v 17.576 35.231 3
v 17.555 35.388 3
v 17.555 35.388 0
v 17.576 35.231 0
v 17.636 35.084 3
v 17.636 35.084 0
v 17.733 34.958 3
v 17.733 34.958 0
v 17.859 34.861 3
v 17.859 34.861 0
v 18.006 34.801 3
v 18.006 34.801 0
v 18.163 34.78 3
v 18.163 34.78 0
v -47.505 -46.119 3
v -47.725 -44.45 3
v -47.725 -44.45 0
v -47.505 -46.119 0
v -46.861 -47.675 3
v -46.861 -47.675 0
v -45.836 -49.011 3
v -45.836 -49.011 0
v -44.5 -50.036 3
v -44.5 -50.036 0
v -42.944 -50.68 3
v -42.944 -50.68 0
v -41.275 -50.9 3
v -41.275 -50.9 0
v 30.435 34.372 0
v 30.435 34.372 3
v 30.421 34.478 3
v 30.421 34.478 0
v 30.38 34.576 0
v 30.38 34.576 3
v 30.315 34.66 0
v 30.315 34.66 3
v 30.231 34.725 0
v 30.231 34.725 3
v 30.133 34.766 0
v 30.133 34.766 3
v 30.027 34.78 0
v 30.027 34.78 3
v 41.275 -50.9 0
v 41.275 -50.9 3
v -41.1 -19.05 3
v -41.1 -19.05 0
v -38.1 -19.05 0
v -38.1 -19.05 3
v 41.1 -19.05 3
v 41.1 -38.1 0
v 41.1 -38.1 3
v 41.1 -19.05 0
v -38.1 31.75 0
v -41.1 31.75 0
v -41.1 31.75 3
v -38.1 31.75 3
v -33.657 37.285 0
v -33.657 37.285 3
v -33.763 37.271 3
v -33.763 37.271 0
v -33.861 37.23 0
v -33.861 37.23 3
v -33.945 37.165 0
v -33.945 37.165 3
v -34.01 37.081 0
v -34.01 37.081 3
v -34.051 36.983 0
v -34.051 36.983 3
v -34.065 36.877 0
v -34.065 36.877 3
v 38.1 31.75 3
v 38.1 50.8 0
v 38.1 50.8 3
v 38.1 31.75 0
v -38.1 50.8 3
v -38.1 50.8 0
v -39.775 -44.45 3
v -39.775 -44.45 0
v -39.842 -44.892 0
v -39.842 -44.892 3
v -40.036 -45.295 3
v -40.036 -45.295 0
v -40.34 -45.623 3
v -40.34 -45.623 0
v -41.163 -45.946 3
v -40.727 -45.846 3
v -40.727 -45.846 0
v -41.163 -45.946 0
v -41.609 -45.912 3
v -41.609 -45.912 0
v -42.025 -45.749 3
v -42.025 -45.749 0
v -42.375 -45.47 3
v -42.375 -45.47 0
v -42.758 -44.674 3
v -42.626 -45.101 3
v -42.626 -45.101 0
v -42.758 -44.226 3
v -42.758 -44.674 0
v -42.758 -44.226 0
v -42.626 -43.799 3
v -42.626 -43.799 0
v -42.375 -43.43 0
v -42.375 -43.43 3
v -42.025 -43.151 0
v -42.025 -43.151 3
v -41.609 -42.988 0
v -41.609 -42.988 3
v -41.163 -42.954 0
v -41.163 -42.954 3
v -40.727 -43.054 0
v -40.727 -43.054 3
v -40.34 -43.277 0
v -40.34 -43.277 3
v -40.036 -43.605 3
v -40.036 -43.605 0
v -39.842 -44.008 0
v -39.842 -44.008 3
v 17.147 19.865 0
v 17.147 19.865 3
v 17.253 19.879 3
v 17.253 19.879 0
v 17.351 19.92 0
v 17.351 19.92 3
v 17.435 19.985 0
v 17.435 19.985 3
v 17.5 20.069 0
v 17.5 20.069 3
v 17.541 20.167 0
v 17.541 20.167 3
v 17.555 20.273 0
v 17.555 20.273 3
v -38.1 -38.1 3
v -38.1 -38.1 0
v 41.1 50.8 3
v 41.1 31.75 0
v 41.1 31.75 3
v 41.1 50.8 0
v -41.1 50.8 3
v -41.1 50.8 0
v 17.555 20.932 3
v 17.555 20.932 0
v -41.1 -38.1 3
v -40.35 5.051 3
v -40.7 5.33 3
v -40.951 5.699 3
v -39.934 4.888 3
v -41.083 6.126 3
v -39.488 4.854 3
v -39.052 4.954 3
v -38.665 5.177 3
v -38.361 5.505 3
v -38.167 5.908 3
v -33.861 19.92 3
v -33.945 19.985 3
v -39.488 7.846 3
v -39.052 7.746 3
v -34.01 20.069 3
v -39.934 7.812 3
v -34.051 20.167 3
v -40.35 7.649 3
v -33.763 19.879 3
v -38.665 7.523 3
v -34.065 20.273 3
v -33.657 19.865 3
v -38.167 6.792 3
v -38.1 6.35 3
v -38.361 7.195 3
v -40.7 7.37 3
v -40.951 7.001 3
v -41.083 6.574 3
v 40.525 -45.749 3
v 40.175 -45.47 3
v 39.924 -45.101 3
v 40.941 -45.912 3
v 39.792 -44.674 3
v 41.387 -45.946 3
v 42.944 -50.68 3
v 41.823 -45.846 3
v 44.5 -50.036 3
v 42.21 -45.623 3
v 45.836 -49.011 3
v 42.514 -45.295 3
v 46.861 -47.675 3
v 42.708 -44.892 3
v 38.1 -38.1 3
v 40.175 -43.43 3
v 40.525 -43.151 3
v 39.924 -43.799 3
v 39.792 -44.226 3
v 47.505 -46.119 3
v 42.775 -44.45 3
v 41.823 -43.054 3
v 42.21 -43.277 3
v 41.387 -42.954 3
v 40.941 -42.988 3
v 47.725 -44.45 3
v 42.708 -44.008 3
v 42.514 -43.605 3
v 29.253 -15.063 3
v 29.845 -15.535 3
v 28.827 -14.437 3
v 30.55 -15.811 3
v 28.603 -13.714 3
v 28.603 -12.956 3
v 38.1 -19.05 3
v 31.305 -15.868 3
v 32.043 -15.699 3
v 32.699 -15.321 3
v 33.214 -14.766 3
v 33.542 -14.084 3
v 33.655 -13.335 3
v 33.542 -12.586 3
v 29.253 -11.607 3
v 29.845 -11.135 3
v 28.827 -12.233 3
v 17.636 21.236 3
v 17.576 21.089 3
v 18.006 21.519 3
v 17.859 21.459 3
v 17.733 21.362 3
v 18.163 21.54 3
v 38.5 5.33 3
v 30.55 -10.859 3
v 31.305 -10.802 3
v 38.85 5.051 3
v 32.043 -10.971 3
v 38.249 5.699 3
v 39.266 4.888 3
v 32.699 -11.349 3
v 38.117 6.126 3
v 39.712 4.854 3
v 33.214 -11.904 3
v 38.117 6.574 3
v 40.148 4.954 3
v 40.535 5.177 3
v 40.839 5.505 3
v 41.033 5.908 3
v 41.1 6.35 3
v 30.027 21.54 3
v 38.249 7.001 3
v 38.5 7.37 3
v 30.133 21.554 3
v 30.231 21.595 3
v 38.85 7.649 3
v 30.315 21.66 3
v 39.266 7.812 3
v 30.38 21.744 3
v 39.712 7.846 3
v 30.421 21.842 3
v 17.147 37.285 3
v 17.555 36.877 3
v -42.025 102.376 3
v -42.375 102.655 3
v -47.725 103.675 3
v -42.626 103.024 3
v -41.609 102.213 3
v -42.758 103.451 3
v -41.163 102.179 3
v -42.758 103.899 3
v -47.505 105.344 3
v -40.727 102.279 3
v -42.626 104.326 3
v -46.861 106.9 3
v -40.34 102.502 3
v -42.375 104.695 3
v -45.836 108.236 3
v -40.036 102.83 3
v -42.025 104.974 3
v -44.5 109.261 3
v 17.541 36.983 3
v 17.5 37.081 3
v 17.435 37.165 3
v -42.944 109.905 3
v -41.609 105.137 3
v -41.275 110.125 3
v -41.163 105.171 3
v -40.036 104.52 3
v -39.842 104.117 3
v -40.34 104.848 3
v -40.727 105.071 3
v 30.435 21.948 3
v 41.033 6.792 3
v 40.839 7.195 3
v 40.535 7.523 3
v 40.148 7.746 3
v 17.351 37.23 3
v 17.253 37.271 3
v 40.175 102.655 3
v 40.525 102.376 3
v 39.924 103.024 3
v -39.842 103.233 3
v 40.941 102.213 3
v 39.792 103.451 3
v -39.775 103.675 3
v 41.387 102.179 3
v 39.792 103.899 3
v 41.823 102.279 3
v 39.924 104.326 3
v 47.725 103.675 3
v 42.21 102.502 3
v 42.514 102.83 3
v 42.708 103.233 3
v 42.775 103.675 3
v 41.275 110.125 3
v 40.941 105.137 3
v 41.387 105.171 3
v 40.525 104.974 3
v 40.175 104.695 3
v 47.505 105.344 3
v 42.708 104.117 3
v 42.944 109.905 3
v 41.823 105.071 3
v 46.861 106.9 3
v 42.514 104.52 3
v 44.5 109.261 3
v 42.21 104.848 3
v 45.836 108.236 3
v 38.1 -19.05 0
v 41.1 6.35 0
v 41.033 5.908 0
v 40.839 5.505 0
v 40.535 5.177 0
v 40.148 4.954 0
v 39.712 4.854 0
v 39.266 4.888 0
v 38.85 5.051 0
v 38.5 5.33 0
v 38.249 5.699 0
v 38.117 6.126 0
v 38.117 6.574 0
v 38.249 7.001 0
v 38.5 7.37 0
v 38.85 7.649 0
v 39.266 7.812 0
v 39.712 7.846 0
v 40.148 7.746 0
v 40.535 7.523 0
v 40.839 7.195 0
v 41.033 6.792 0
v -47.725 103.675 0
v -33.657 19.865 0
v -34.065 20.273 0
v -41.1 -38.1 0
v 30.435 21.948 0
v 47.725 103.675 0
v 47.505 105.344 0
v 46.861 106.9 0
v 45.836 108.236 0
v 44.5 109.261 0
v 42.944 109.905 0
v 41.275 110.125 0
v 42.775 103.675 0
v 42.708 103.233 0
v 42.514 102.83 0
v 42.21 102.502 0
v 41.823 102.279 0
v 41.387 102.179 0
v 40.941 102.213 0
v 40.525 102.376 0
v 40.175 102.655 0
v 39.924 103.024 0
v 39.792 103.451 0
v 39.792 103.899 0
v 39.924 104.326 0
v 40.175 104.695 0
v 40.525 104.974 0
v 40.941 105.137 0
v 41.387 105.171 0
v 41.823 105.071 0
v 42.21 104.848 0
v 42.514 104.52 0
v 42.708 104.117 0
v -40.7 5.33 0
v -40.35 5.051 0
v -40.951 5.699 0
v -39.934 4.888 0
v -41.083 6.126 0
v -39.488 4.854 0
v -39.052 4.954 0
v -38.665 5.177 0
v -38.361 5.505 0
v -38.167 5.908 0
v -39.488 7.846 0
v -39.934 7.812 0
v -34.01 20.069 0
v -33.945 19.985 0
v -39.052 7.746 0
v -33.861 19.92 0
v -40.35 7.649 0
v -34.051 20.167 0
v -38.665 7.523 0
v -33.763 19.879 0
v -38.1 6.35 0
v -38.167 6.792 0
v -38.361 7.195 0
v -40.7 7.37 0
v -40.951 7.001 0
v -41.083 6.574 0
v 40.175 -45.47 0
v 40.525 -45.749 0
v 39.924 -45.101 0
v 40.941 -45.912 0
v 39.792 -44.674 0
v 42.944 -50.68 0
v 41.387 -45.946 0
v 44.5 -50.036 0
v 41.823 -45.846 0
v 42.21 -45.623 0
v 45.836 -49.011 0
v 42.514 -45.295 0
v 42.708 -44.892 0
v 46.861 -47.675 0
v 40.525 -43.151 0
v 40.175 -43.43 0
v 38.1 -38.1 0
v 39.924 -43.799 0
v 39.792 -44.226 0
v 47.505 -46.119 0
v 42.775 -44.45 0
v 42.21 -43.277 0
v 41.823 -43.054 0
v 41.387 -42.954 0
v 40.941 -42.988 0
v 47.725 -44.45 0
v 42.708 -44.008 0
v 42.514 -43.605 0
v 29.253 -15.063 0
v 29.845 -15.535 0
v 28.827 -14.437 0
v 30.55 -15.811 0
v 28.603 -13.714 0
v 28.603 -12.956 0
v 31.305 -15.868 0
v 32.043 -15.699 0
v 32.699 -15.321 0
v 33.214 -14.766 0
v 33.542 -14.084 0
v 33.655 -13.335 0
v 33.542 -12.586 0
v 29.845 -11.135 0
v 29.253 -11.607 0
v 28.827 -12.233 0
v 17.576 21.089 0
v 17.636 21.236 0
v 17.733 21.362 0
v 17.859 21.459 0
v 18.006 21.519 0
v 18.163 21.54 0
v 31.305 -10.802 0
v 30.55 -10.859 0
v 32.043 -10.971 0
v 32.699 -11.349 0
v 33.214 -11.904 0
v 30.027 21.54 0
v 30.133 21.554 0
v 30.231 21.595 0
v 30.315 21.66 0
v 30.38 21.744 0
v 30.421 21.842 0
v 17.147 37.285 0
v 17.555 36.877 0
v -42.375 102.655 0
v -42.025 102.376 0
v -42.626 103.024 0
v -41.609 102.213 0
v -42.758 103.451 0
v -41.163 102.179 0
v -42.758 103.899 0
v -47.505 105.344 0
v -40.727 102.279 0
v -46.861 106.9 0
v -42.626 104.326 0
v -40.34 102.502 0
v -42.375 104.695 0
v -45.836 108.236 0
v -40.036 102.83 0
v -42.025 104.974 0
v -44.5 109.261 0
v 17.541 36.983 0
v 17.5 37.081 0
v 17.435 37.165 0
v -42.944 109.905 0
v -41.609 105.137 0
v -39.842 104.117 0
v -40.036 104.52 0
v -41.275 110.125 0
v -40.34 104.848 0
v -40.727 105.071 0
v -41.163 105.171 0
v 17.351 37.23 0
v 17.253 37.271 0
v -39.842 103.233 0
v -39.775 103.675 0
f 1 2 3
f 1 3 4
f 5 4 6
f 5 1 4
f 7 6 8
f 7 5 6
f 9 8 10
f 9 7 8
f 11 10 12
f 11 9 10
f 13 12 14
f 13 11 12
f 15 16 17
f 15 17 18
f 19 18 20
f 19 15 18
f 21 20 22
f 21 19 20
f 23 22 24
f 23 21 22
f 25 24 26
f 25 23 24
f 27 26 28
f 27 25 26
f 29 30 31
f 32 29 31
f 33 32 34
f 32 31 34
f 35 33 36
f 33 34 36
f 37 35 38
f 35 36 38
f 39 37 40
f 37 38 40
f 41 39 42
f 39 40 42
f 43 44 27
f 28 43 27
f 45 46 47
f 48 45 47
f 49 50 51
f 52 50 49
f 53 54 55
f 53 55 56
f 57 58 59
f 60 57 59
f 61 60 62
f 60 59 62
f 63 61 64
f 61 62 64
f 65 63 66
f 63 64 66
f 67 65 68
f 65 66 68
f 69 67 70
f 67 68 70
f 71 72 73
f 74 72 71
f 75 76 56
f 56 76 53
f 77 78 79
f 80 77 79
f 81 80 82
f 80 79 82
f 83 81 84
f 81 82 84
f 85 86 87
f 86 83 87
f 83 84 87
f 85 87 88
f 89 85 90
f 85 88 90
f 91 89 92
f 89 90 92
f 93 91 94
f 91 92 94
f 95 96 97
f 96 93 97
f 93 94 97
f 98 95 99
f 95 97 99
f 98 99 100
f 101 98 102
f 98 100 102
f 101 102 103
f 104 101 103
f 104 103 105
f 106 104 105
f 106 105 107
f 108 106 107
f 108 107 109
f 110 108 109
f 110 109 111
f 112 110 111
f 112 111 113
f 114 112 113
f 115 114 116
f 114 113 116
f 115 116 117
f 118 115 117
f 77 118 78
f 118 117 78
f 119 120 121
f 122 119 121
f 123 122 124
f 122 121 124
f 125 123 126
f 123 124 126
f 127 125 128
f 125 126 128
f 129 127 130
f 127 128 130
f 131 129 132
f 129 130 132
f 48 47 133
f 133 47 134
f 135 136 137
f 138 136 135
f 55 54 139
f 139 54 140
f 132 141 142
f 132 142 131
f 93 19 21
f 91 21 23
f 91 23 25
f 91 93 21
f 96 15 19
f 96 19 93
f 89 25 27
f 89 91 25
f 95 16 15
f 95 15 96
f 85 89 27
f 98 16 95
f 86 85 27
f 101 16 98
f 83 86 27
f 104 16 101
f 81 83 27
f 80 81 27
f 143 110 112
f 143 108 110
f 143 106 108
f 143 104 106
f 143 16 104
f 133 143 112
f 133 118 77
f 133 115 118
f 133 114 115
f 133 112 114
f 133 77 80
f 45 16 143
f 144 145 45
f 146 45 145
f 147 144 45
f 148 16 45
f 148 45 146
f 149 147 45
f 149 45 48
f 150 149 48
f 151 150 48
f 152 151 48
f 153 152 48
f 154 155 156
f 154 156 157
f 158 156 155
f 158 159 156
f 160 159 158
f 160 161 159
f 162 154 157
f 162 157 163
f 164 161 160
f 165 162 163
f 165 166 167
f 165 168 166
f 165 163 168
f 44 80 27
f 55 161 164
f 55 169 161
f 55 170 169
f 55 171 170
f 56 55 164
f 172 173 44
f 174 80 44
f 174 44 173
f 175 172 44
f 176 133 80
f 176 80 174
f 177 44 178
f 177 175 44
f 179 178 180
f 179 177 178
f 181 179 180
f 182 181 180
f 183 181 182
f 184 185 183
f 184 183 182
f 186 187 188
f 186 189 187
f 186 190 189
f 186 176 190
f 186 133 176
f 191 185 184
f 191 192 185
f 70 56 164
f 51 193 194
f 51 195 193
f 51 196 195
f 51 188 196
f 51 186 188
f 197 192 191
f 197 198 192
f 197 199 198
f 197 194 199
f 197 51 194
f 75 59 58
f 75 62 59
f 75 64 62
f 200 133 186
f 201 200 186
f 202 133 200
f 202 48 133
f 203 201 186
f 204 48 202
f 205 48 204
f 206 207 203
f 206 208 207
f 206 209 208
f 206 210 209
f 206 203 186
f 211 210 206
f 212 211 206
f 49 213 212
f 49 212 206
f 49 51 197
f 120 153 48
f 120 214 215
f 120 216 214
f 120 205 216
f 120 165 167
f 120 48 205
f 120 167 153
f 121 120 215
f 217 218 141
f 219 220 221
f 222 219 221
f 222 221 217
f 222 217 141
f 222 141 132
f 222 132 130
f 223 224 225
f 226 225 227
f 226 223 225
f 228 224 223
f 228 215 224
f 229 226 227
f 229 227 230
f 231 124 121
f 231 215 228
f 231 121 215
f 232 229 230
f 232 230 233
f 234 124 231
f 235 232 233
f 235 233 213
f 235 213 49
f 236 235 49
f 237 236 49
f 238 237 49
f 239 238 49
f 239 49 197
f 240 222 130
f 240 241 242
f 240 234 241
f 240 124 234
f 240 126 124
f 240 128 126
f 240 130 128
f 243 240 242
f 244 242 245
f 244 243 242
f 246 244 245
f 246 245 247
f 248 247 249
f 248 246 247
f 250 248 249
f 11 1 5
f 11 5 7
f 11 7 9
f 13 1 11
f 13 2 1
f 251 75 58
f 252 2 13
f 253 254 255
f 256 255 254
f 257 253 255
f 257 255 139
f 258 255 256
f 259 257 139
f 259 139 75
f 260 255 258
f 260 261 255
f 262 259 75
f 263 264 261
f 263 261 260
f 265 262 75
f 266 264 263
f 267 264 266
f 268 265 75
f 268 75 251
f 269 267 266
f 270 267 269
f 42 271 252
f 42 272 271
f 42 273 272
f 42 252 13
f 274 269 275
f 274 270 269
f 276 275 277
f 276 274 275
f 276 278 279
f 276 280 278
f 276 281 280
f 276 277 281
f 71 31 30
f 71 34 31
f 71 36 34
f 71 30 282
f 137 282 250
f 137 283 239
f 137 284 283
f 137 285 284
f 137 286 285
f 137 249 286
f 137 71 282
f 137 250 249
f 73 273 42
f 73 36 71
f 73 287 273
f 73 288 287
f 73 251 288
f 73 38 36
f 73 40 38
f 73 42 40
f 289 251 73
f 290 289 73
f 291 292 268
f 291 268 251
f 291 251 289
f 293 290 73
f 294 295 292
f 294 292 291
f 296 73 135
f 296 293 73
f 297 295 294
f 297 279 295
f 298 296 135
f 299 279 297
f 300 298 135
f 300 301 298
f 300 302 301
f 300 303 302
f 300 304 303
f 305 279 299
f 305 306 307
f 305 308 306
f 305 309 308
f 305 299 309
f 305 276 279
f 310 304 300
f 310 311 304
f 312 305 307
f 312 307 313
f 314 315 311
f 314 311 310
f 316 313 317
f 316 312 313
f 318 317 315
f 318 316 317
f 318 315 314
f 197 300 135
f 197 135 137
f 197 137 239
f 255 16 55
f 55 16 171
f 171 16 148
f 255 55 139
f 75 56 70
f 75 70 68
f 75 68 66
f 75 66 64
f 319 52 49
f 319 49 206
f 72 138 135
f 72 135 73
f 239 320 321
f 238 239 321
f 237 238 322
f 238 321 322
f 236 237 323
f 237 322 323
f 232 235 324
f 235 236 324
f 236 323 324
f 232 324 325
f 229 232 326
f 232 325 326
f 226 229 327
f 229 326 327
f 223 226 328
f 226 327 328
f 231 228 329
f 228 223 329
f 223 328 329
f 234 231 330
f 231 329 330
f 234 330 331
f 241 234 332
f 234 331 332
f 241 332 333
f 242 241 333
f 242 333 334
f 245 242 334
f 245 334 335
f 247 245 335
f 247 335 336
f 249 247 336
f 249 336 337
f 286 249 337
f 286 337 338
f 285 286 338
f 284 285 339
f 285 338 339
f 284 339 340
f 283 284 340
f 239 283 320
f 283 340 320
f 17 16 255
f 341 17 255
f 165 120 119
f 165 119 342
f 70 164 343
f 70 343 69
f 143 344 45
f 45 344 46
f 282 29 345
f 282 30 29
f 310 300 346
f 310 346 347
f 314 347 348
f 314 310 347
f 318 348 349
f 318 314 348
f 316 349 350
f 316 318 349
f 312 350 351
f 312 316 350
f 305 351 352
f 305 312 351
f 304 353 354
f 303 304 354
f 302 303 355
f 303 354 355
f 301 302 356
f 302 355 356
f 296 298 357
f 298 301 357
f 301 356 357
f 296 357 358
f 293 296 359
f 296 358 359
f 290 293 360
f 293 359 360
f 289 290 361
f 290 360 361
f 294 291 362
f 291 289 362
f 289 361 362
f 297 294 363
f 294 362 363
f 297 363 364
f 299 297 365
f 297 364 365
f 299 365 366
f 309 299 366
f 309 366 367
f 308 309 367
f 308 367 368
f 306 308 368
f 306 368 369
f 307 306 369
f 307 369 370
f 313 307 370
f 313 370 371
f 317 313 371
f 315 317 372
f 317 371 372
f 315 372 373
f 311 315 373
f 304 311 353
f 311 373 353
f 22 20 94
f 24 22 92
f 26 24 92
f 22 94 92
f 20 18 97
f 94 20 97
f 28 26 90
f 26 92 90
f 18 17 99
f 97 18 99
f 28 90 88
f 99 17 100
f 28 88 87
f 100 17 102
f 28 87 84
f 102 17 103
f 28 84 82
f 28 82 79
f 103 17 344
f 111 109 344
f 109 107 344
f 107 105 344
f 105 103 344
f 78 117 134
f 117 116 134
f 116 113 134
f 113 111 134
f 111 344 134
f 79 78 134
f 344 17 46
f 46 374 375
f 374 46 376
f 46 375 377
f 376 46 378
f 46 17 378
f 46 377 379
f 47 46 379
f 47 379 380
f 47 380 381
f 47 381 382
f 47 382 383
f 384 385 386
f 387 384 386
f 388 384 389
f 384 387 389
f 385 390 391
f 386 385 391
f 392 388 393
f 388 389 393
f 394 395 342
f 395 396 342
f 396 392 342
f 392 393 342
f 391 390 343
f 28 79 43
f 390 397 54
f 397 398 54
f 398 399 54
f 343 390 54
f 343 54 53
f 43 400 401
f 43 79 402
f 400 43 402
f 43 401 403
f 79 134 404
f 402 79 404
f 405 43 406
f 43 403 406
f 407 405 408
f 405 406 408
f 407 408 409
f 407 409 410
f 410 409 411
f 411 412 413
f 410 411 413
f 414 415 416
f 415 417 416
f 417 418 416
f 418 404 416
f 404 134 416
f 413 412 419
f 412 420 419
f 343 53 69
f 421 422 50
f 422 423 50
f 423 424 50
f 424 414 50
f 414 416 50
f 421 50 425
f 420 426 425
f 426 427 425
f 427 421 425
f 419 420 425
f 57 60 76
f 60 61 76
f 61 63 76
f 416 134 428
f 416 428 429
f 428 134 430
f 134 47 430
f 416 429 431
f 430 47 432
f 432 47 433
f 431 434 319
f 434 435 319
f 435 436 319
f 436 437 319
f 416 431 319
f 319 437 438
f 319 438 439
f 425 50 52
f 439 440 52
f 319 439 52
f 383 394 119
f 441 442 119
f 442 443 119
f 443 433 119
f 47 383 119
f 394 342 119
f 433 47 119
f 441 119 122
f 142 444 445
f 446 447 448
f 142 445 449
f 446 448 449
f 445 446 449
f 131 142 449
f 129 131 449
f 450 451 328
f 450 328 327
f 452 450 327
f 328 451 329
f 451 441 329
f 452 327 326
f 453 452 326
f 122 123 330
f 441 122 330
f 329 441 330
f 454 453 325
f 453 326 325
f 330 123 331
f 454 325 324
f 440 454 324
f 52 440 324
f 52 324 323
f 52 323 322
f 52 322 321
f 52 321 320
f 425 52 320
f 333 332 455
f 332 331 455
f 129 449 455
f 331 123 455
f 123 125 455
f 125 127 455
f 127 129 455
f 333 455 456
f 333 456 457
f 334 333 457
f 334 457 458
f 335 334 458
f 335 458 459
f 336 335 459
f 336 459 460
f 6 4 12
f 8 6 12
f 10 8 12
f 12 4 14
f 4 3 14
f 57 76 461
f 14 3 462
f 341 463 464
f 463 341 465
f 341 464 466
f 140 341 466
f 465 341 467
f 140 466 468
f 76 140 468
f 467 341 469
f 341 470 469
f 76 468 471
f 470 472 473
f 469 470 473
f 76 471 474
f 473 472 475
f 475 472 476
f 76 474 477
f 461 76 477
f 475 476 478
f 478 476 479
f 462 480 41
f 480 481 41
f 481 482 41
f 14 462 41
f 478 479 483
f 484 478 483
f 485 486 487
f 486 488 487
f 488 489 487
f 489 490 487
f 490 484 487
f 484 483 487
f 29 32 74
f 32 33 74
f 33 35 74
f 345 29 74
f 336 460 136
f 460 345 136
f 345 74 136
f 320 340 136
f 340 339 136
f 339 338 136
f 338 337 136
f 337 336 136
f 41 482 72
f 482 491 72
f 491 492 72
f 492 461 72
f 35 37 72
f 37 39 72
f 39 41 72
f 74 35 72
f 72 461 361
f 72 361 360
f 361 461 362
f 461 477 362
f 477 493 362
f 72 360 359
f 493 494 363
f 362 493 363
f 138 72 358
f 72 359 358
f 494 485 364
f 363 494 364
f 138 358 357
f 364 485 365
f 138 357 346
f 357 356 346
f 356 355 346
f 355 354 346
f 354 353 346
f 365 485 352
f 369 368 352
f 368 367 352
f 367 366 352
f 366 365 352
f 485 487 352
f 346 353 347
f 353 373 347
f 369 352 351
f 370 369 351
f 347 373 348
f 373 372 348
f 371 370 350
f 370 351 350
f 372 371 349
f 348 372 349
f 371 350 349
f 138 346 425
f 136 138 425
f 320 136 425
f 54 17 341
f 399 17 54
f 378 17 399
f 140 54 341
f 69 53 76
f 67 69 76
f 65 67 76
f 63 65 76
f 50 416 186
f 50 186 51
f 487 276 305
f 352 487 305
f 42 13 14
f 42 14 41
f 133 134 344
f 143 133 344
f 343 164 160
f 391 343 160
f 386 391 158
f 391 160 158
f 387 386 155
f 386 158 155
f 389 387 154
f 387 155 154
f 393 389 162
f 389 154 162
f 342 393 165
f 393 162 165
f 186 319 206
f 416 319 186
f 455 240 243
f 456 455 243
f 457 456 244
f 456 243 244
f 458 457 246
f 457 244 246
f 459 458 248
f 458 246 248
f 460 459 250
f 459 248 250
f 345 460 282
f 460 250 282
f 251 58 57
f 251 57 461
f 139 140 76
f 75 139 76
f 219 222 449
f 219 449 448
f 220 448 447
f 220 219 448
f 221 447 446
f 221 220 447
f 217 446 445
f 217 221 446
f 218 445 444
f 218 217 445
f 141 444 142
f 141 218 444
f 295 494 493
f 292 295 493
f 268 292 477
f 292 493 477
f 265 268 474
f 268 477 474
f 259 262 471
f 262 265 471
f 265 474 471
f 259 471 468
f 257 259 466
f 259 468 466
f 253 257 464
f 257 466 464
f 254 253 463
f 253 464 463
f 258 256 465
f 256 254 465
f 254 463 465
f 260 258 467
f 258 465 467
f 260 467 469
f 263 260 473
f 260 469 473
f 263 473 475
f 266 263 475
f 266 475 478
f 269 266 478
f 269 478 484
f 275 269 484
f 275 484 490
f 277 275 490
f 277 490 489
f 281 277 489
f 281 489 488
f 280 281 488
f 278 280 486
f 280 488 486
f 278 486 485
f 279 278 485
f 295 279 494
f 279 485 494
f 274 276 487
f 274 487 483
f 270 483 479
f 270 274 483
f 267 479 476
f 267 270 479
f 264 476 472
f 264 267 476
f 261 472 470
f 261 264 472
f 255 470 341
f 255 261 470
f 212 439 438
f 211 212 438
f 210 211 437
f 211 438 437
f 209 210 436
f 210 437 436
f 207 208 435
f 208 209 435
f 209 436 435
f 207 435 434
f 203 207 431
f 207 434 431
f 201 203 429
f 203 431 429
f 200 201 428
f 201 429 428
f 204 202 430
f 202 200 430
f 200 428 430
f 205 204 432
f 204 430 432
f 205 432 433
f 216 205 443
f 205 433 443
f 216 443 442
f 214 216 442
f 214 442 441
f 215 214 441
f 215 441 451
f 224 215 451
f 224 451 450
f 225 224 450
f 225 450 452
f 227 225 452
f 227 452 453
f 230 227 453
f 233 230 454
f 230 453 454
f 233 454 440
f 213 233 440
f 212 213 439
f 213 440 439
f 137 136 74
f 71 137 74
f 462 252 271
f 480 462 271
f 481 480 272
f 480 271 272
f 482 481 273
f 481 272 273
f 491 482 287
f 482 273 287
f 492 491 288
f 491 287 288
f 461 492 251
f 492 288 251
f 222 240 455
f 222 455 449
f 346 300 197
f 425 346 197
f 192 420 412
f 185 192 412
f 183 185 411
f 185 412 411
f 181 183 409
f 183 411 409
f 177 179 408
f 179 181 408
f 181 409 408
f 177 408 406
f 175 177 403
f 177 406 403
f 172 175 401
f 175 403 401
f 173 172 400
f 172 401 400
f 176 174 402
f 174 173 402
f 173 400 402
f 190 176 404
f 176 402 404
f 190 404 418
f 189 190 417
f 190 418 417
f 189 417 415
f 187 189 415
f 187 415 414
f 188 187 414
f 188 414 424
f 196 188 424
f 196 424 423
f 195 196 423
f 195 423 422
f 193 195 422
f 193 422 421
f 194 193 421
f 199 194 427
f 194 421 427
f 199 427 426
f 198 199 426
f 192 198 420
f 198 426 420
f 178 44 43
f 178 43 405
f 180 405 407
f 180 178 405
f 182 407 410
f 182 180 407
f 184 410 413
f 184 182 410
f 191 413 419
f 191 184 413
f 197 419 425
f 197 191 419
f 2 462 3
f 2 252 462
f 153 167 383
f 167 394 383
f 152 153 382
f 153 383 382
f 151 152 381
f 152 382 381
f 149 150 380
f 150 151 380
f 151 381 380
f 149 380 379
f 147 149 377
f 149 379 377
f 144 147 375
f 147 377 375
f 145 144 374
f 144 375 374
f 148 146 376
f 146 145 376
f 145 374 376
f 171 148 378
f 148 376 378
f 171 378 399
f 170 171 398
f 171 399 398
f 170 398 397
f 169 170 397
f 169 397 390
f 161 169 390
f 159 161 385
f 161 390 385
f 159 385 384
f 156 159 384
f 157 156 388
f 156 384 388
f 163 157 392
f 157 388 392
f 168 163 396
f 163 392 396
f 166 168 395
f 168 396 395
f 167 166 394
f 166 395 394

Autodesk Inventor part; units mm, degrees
ref_plane "YZ Plane" through (0, 0, 0) normal (1, 0, 0) x (0, 1, 0)
ref_plane "XZ Plane" through (0, 0, 0) normal (0, 1, 0) x (-1, 0, 0)
ref_plane "XY Plane" through (0, 0, 0) normal (0, 0, 1) x (1, 0, 0)
sketch "Sketch1" plane through (0, 0, 0) normal (0, 0, 1) x (1, 0, 0)
  line L0 (30.48, -47.625) -> (-30.48, -47.625) construction
  line L1 (-34.925, -43.18) -> (-34.925, 43.18) construction
  line L2 (-30.48, 47.625) -> (30.48, 47.625) construction
  line L3 (34.925, 43.18) -> (34.925, -43.18) construction
  line L4 (34.925, -47.625) -> (-34.925, 47.625) construction
  line L5 (-34.925, -47.625) -> (34.925, 47.625) construction
  arc A0 (-30.48, 47.625) -> (-34.925, 43.18) centre (-30.48, 43.18) ccw construction
  arc A1 (34.925, 43.18) -> (30.48, 47.625) centre (30.48, 43.18) ccw construction
  arc A2 (30.48, -47.625) -> (34.925, -43.18) centre (30.48, -43.18) ccw construction
  arc A3 (-34.925, -43.18) -> (-30.48, -47.625) centre (-30.48, -43.18) ccw construction
  circle A4 centre (-30.48, 43.18) radius 1.5
  circle A5 centre (30.48, 43.18) radius 1.5
  circle A6 centre (-30.48, -43.18) radius 1.5
  circle A7 centre (30.48, -43.18) radius 1.5
  circle A8 centre (0, -22.86) radius 6.35
  line L6 (-3.175, -7.62) -> (3.175, -7.62) construction
  line L7 (-3.175, -12.065) -> (3.175, -12.065)
  line L8 (3.175, -3.175) -> (-3.175, -3.175)
  arc A9 (-3.175, -3.175) -> (-3.175, -12.065) centre (-3.175, -7.62) ccw
  arc A10 (3.175, -12.065) -> (3.175, -3.175) centre (3.175, -7.62) ccw
  line L9 (-35.3, 57.15) -> (35.3, 57.15) construction
  line L10 (35.3, 57.15) -> (35.3, 106.85) construction
  line L11 (35.3, 106.85) -> (-35.3, 106.85) construction
  line L12 (-35.3, 106.85) -> (-35.3, 57.15) construction
  circle A11 centre (-33.25, 104.75) radius 1.25
  circle A12 centre (33.25, 104.75) radius 1.25
  circle A13 centre (33.25, 59.25) radius 1.25
  circle A14 centre (-33.25, 59.25) radius 1.25
  line L13 (-41.275, 110.025) -> (41.275, 110.025)
  line L14 (47.625, 103.675) -> (47.625, -44.45)
  line L15 (41.275, -50.8) -> (-41.275, -50.8)
  line L16 (-47.625, -44.45) -> (-47.625, 103.675)
  arc A15 (-41.275, 110.025) -> (-47.625, 103.675) centre (-41.275, 103.675) ccw
  arc A16 (47.625, 103.675) -> (41.275, 110.025) centre (41.275, 103.675) ccw
  arc A17 (41.275, -50.8) -> (47.625, -44.45) centre (41.275, -44.45) ccw
  arc A18 (-47.625, -44.45) -> (-41.275, -50.8) centre (-41.275, -44.45) ccw
  circle A19 centre (-41.275, 103.675) radius 1.5
  circle A20 centre (-41.275, -44.45) radius 1.5
  circle A21 centre (41.275, -44.45) radius 1.5
  circle A22 centre (41.275, 103.675) radius 1.5
  line L17 (-0.635, -22.225) -> (-0.635, -20.32)
  line L18 (-0.635, -20.32) -> (-3.175, -22.86)
  line L19 (-3.175, -22.86) -> (-0.635, -25.4)
  line L20 (-0.635, -25.4) -> (-0.635, -23.495)
  line L21 (-0.635, -23.495) -> (3.175, -23.495)
  line L22 (3.175, -23.495) -> (3.175, -20.32)
  line L23 (3.175, -20.32) -> (1.905, -20.32)
  line L24 (1.905, -20.32) -> (1.905, -22.225)
  line L25 (1.905, -22.225) -> (-0.635, -22.225)
  line L26 (-2.54, -8.89) -> (2.54, -8.89)
  line L27 (2.54, -8.89) -> (2.54, -7.62)
  line L28 (2.54, -7.62) -> (0, -5.08)
  line L29 (0, -5.08) -> (-2.54, -7.62)
  line L30 (-2.54, -7.62) -> (-2.54, -8.89)
  arc A23 (-19.685, -26.035) -> (-10.795, -26.035) centre (-15.24, -26.035) ccw
  line L31 (-19.685, -19.685) -> (-19.685, -26.035)
  arc A24 (-10.795, -19.685) -> (-19.685, -19.685) centre (-15.24, -19.685) ccw
  line L32 (-10.795, -26.035) -> (-10.795, -19.685)
  line L33 (-13.97, -25.4) -> (-13.97, -20.32)
  line L34 (-13.97, -20.32) -> (-15.24, -20.32)
  line L35 (-15.24, -20.32) -> (-17.78, -22.86)
  line L36 (-17.78, -22.86) -> (-15.24, -25.4)
  line L37 (-15.24, -25.4) -> (-13.97, -25.4)
  arc A25 (3.175, -42.545) -> (3.175, -33.655) centre (3.175, -38.1) ccw
  line L38 (-3.175, -42.545) -> (3.175, -42.545)
  arc A26 (-3.175, -33.655) -> (-3.175, -42.545) centre (-3.175, -38.1) ccw
  line L39 (3.175, -33.655) -> (-3.175, -33.655)
  line L40 (2.54, -36.83) -> (-2.54, -36.83)
  line L41 (-2.54, -36.83) -> (-2.54, -38.1)
  line L42 (-2.54, -38.1) -> (0, -40.64)
  line L43 (0, -40.64) -> (2.54, -38.1)
  line L44 (2.54, -38.1) -> (2.54, -36.83)
  arc A27 (19.685, -19.685) -> (10.795, -19.685) centre (15.24, -19.685) ccw
  line L45 (19.685, -26.035) -> (19.685, -19.685)
  arc A28 (10.795, -26.035) -> (19.685, -26.035) centre (15.24, -26.035) ccw
  line L46 (10.795, -19.685) -> (10.795, -26.035)
  line L47 (13.97, -20.32) -> (13.97, -25.4)
  line L48 (13.97, -25.4) -> (15.24, -25.4)
  line L49 (15.24, -25.4) -> (17.78, -22.86)
  line L50 (17.78, -22.86) -> (15.24, -20.32)
  line L51 (15.24, -20.32) -> (13.97, -20.32)
  line L52 (5.205, 21.035) -> (16.385, 21.035) construction
  line L53 (16.385, 21.035) -> (16.385, 36.115) construction
  line L54 (16.385, 36.115) -> (5.205, 36.115) construction
  line L55 (5.205, 36.115) -> (5.205, 21.035) construction
  line L56 (5.205, 21.035) -> (16.385, 36.115) construction
  line L57 (16.385, 21.035) -> (5.205, 36.115) construction
  line L58 (20.265, 22.71) -> (29.265, 22.71) construction
  line L59 (29.265, 22.71) -> (29.265, 33.61) construction
  line L60 (29.265, 33.61) -> (20.265, 33.61) construction
  line L61 (20.265, 33.61) -> (20.265, 22.71) construction
  line L62 (-7.495, 36.115) -> (-7.495, 21.035) construction
  line L63 (3.685, 36.115) -> (-7.495, 36.115) construction
  line L64 (3.685, 21.035) -> (3.685, 36.115) construction
  line L65 (-7.495, 21.035) -> (3.685, 21.035) construction
  line L66 (-20.195, 36.115) -> (-20.195, 21.035) construction
  line L67 (-9.015, 36.115) -> (-20.195, 36.115) construction
  line L68 (-9.015, 21.035) -> (-9.015, 36.115) construction
  line L69 (-20.195, 21.035) -> (-9.015, 21.035) construction
  line L70 (-32.895, 36.115) -> (-32.895, 21.035) construction
  line L71 (-21.715, 36.115) -> (-32.895, 36.115) construction
  line L72 (-21.715, 21.035) -> (-21.715, 36.115) construction
  line L73 (-32.895, 21.035) -> (-21.715, 21.035) construction
  line L74 (-33.657, 37.385) -> (17.147, 37.385)
  line L75 (17.655, 36.877) -> (17.655, 35.388)
  line L76 (18.163, 34.88) -> (30.027, 34.88)
  line L77 (30.535, 34.372) -> (30.535, 21.948)
  line L78 (30.027, 21.44) -> (18.163, 21.44)
  line L79 (17.655, 20.932) -> (17.655, 20.273)
  line L80 (17.147, 19.765) -> (-33.657, 19.765)
  line L81 (-34.165, 20.273) -> (-34.165, 36.877)
  arc A29 (-33.657, 37.385) -> (-34.165, 36.877) centre (-33.657, 36.877) ccw
  arc A30 (17.655, 36.877) -> (17.147, 37.385) centre (17.147, 36.877) ccw
  arc A31 (17.655, 35.388) -> (18.163, 34.88) centre (18.163, 35.388) ccw
  arc A32 (30.535, 34.372) -> (30.027, 34.88) centre (30.027, 34.372) ccw
  arc A33 (30.027, 21.44) -> (30.535, 21.948) centre (30.027, 21.948) ccw
  arc A34 (18.163, 21.44) -> (17.655, 20.932) centre (18.163, 20.932) ccw
  arc A35 (17.147, 19.765) -> (17.655, 20.273) centre (17.147, 20.273) ccw
  arc A36 (-34.165, 20.273) -> (-33.657, 19.765) centre (-33.657, 20.273) ccw
  line L82 (-41.1, 50.8) -> (-38.1, 50.8)
  line L83 (-38.1, 50.8) -> (-38.1, 31.75)
  line L84 (-38.1, -38.1) -> (-41.1, -38.1)
  line L85 (-41.1, -38.1) -> (-41.1, -19.05)
  line L86 (-41.1, 31.75) -> (-38.1, 31.75)
  line L87 (-41.1, -19.05) -> (-38.1, -19.05)
  line L88 (-41.1, 31.75) -> (-41.1, 50.8)
  line L89 (-41.1, -19.05) -> (-41.1, 31.75) construction
  line L90 (-38.1, -19.05) -> (-38.1, -38.1)
  line L91 (-38.1, 31.75) -> (-38.1, -19.05) construction
  circle A37 centre (-39.6, 6.35) radius 1.5
  line L92 (0, -68.4111) -> (0, 116.4523)
  line L93 (41.1, 50.8) -> (38.1, 50.8)
  line L94 (38.1, 50.8) -> (38.1, 31.75)
  line L95 (38.1, -38.1) -> (41.1, -38.1)
  line L96 (41.1, -38.1) -> (41.1, -19.05)
  line L97 (41.1, 31.75) -> (38.1, 31.75)
  line L98 (41.1, -19.05) -> (38.1, -19.05)
  line L99 (41.1, 31.75) -> (41.1, 50.8)
  line L100 (38.1, -19.05) -> (38.1, -38.1)
  circle A38 centre (39.6, 6.35) radius 1.5
  circle A39 centre (31.115, -13.335) radius 2.54
  point P0 (0, 0)
  point P1 (0, 0)
  point P2 (0, -7.62)
  point P3 (0, 57.15)
  point P4 (0, 0)
  point P5 (35.3, 82)
  point P6 (0, -8.89)
  point P7 (-13.97, -22.86)
  point P8 (0, -36.83)
  point P9 (13.97, -22.86)
  point P10 (10.795, 28.575)
  point P11 (24.765, 29.21)
  point P12 (24.765, 33.61)
  point P13 (-38.1, 6.35)
  point P14 (-39.6, 50.8)
  dimension "d0" = 69.85
  dimension "d1" = 95.25
  dimension "d2" = 4.445
  dimension "d3" = 3
  dimension "d4" = 24.765
  dimension "d5" = 12.7
  dimension "d6" = 6.35
  dimension "d7" = 8.89
  dimension "d8" = 15.24
  dimension "d9" = 70.6
  dimension "d10" = 49.7
  dimension "d11" = 9.525
  dimension "d12" = 66.5
  dimension "d13" = 33.25
  dimension "d14" = 45.5
  dimension "d15" = 22.75
  dimension "d16" = 2.5
  dimension "d17" = 3.175
  dimension "d18" = 12.7
  dimension "d19" = 3.175
  dimension "d20" = 12.7
  dimension "d21" = 6.35
  dimension "d22" = 3
  dimension "d25" = 1.27
  dimension "d26" = 1.27
  dimension "d27" = 0.635
  dimension "d28" = 0.635
  dimension "d29" = 5.08
  dimension "d30" = 2.54
  dimension "d31" = 3.81
  dimension "d32" = 3.175
  dimension "d33" = 5.08
  dimension "d34" = 1.27
  dimension "d35" = 2.54
  dimension "d38" = 360
  dimension "d42" = 11.18
  dimension "d43" = 15.08
  dimension "d44" = 19.05
  dimension "d45" = 24.13
  dimension "d54" = 6.5
  dimension "d55" = 10.9
  dimension "d56" = 9
  dimension "d57" = 10.16
  dimension "d58" = 18.415
  dimension "d61" = 12.7
  dimension "d66" = 1.27
  dimension "d67" = 1.27
  dimension "d68" = 1.27
  dimension "d69" = 1.27
  dimension "d70" = 1.27
  dimension "d71" = 1.27
  dimension "d72" = 1.27
  dimension "d73" = 0.508
  dimension "d74" = 3
  dimension "d76" = 12.7
  dimension "d77" = 88.9
  dimension "d78" = 19.05
  dimension "d79" = 19.05
  dimension "d80" = 3
  dimension "d81" = 76.2
  dimension "d88" = 34.29
  dimension "d89" = 3.81
  dimension "d90" = 5.08
extrude "Extrusion3" add sketch "Sketch1" along normal blind 3 contours A4 | A5 | A6 | A7 | A8 L92 L21 L22 L23 L24 L25 | A8 L92 L7 A10 L8 L80 A35 L79 A34 L78 A33 L77 A32 L76 A31 L75 A30 L74 L13 A16 L14 A17 L15 L38 A25 L39 | L92 L25 L17 L18 L19 L20 L21 A8 | A8 L92 L39 A26 L38 L15 A18 L16 A15 L13 L74 A29 L81 A36 L80 L8 A9 L7 | L92 L21 L20 L19 L18 L17 L25 | L25 L24 L23 L22 L21 L92 | L92 L26 L27 L28 L8 A10 L7 | L7 A9 L8 L92 L29 L30 L26 | L92 L40 L41 L42 L38 A26 L39 | L39 A25 L38 L92 L43 L44 L40 | L92 L28 L27 L26 | L26 L30 L29 L92 | L92 L42 L41 L40 | L40 L44 L43 L92 | A11 | A12 | A13 | A14 | L31 A24 L32 A23 | L37 L36 L35 L34 L33 | L45 A28 L46 A27 | L51 L50 L49 L48 L47
sketch "Sketch2" plane through (0, 0, 3) normal (0, 0, 1) x (1, 0, 0)
  arc A0 (17.655, 36.877) -> (17.147, 37.385) centre (17.147, 36.877) ccw projected
  line L0 (17.655, 36.877) -> (17.655, 35.388) projected
  arc A1 (17.655, 35.388) -> (18.163, 34.88) centre (18.163, 35.388) ccw projected
  line L1 (18.163, 34.88) -> (30.027, 34.88) projected
  arc A2 (30.535, 34.372) -> (30.027, 34.88) centre (30.027, 34.372) ccw projected
  line L2 (30.535, 34.372) -> (30.535, 21.948) projected
  arc A3 (30.027, 21.44) -> (30.535, 21.948) centre (30.027, 21.948) ccw projected
  line L3 (30.027, 21.44) -> (18.163, 21.44) projected
  arc A4 (18.163, 21.44) -> (17.655, 20.932) centre (18.163, 20.932) ccw projected
  line L4 (17.655, 20.932) -> (17.655, 20.273) projected
  arc A5 (17.147, 19.765) -> (17.655, 20.273) centre (17.147, 20.273) ccw projected
  line L5 (17.147, 19.765) -> (-33.657, 19.765) projected
  arc A6 (-34.165, 20.273) -> (-33.657, 19.765) centre (-33.657, 20.273) ccw projected
  line L6 (-34.165, 20.273) -> (-34.165, 36.877) projected
  arc A7 (-33.657, 37.385) -> (-34.165, 36.877) centre (-33.657, 36.877) ccw projected
  line L7 (-33.657, 37.385) -> (17.147, 37.385) projected
  line L8 (41.1, -19.05) -> (41.1, -38.1) projected
  line L9 (41.1, -38.1) -> (38.1, -38.1) projected
  line L10 (38.1, -38.1) -> (38.1, -19.05) projected
  line L11 (38.1, -19.05) -> (41.1, -19.05) projected
  line L12 (38.1, 31.75) -> (38.1, 50.8) projected
  line L13 (38.1, 50.8) -> (41.1, 50.8) projected
  line L14 (41.1, 50.8) -> (41.1, 31.75) projected
  line L15 (41.1, 31.75) -> (38.1, 31.75) projected
  line L16 (-41.1, -38.1) -> (-41.1, -19.05) projected
  line L17 (-41.1, -19.05) -> (-38.1, -19.05) projected
  line L18 (-38.1, -19.05) -> (-38.1, -38.1) projected
  line L19 (-38.1, -38.1) -> (-41.1, -38.1) projected
  line L20 (-38.1, 50.8) -> (-38.1, 31.75) projected
  line L21 (-38.1, 31.75) -> (-41.1, 31.75) projected
  line L22 (-41.1, 31.75) -> (-41.1, 50.8) projected
  line L23 (-41.1, 50.8) -> (-38.1, 50.8) projected
  circle A8 centre (39.6, 6.35) radius 1.5 projected
  circle A9 centre (-39.6, 6.35) radius 1.5 projected
  circle A10 centre (41.275, 103.675) radius 1.5 projected
  circle A11 centre (41.275, -44.45) radius 1.5 projected
  circle A12 centre (-41.275, -44.45) radius 1.5 projected
  circle A13 centre (-41.275, 103.675) radius 1.5 projected
  line L24 (41.275, 110.025) -> (-41.275, 110.025) projected
  arc A14 (-41.275, 110.025) -> (-47.625, 103.675) centre (-41.275, 103.675) ccw projected
  line L25 (-47.625, 103.675) -> (-47.625, -44.45) projected
  arc A15 (-47.625, -44.45) -> (-41.275, -50.8) centre (-41.275, -44.45) ccw projected
  line L26 (-41.275, -50.8) -> (41.275, -50.8) projected
  arc A16 (41.275, -50.8) -> (47.625, -44.45) centre (41.275, -44.45) ccw projected
  line L27 (47.625, -44.45) -> (47.625, 103.675) projected
  arc A17 (47.625, 103.675) -> (41.275, 110.025) centre (41.275, 103.675) ccw projected
  line L28 (-47.725, -44.45) -> (-47.725, 103.675)
  arc A18 (-41.275, 110.125) -> (-47.725, 103.675) centre (-41.275, 103.675) ccw
  line L29 (-41.275, 110.125) -> (41.275, 110.125)
  arc A19 (47.725, 103.675) -> (41.275, 110.125) centre (41.275, 103.675) ccw
  line L30 (47.725, 103.675) -> (47.725, -44.45)
  arc A20 (41.275, -50.9) -> (47.725, -44.45) centre (41.275, -44.45) ccw
  line L31 (41.275, -50.9) -> (-41.275, -50.9)
  arc A21 (-47.725, -44.45) -> (-41.275, -50.9) centre (-41.275, -44.45) ccw
  arc A22 (17.555, 36.877) -> (17.147, 37.285) centre (17.147, 36.877) ccw
  line L32 (17.555, 36.877) -> (17.555, 35.388)
  arc A23 (17.555, 35.388) -> (18.163, 34.78) centre (18.163, 35.388) ccw
  line L33 (18.163, 34.78) -> (30.027, 34.78)
  arc A24 (30.435, 34.372) -> (30.027, 34.78) centre (30.027, 34.372) ccw
  line L34 (30.435, 34.372) -> (30.435, 21.948)
  arc A25 (30.027, 21.54) -> (30.435, 21.948) centre (30.027, 21.948) ccw
  line L35 (30.027, 21.54) -> (18.163, 21.54)
  arc A26 (18.163, 21.54) -> (17.555, 20.932) centre (18.163, 20.932) ccw
  line L36 (17.555, 20.932) -> (17.555, 20.273)
  arc A27 (17.147, 19.865) -> (17.555, 20.273) centre (17.147, 20.273) ccw
  line L37 (17.147, 19.865) -> (-33.657, 19.865)
  arc A28 (-34.065, 20.273) -> (-33.657, 19.865) centre (-33.657, 20.273) ccw
  line L38 (-34.065, 20.273) -> (-34.065, 36.877)
  arc A29 (-33.657, 37.285) -> (-34.065, 36.877) centre (-33.657, 36.877) ccw
  line L39 (-33.657, 37.285) -> (17.147, 37.285)
  point P0 (0, 0)
  dimension "d84" = 0.1
  dimension "d85" = 0.1
extrude "Extrusion4" add sketch "Sketch2" against normal up to surface (3 mm away) contours L0 A1 L1 A2 L2 A3 L3 A4 L4 A5 L5 A6 L6 A7 L7 A0 | L28 A18 L29 A19 L30 A20 L31 A21
equation "\"d13\" = 0.5 * d12"
equation "\"d15\" = 0.5 * d14"
equation "\"d19\" = d17"
equation "\"d20\" = d18"
equation "\"d28\" = 0.5 * d26"
equation "\"d67\" = d66"
equation "\"d68\" = d66"
equation "\"d69\" = d66"
equation "\"d70\" = d66"
equation "\"d71\" = d66"
equation "\"d72\" = d66"
equation "\"d78\" = d79"
equation "\"d85\" = d84"
properties part number "BackCover"
